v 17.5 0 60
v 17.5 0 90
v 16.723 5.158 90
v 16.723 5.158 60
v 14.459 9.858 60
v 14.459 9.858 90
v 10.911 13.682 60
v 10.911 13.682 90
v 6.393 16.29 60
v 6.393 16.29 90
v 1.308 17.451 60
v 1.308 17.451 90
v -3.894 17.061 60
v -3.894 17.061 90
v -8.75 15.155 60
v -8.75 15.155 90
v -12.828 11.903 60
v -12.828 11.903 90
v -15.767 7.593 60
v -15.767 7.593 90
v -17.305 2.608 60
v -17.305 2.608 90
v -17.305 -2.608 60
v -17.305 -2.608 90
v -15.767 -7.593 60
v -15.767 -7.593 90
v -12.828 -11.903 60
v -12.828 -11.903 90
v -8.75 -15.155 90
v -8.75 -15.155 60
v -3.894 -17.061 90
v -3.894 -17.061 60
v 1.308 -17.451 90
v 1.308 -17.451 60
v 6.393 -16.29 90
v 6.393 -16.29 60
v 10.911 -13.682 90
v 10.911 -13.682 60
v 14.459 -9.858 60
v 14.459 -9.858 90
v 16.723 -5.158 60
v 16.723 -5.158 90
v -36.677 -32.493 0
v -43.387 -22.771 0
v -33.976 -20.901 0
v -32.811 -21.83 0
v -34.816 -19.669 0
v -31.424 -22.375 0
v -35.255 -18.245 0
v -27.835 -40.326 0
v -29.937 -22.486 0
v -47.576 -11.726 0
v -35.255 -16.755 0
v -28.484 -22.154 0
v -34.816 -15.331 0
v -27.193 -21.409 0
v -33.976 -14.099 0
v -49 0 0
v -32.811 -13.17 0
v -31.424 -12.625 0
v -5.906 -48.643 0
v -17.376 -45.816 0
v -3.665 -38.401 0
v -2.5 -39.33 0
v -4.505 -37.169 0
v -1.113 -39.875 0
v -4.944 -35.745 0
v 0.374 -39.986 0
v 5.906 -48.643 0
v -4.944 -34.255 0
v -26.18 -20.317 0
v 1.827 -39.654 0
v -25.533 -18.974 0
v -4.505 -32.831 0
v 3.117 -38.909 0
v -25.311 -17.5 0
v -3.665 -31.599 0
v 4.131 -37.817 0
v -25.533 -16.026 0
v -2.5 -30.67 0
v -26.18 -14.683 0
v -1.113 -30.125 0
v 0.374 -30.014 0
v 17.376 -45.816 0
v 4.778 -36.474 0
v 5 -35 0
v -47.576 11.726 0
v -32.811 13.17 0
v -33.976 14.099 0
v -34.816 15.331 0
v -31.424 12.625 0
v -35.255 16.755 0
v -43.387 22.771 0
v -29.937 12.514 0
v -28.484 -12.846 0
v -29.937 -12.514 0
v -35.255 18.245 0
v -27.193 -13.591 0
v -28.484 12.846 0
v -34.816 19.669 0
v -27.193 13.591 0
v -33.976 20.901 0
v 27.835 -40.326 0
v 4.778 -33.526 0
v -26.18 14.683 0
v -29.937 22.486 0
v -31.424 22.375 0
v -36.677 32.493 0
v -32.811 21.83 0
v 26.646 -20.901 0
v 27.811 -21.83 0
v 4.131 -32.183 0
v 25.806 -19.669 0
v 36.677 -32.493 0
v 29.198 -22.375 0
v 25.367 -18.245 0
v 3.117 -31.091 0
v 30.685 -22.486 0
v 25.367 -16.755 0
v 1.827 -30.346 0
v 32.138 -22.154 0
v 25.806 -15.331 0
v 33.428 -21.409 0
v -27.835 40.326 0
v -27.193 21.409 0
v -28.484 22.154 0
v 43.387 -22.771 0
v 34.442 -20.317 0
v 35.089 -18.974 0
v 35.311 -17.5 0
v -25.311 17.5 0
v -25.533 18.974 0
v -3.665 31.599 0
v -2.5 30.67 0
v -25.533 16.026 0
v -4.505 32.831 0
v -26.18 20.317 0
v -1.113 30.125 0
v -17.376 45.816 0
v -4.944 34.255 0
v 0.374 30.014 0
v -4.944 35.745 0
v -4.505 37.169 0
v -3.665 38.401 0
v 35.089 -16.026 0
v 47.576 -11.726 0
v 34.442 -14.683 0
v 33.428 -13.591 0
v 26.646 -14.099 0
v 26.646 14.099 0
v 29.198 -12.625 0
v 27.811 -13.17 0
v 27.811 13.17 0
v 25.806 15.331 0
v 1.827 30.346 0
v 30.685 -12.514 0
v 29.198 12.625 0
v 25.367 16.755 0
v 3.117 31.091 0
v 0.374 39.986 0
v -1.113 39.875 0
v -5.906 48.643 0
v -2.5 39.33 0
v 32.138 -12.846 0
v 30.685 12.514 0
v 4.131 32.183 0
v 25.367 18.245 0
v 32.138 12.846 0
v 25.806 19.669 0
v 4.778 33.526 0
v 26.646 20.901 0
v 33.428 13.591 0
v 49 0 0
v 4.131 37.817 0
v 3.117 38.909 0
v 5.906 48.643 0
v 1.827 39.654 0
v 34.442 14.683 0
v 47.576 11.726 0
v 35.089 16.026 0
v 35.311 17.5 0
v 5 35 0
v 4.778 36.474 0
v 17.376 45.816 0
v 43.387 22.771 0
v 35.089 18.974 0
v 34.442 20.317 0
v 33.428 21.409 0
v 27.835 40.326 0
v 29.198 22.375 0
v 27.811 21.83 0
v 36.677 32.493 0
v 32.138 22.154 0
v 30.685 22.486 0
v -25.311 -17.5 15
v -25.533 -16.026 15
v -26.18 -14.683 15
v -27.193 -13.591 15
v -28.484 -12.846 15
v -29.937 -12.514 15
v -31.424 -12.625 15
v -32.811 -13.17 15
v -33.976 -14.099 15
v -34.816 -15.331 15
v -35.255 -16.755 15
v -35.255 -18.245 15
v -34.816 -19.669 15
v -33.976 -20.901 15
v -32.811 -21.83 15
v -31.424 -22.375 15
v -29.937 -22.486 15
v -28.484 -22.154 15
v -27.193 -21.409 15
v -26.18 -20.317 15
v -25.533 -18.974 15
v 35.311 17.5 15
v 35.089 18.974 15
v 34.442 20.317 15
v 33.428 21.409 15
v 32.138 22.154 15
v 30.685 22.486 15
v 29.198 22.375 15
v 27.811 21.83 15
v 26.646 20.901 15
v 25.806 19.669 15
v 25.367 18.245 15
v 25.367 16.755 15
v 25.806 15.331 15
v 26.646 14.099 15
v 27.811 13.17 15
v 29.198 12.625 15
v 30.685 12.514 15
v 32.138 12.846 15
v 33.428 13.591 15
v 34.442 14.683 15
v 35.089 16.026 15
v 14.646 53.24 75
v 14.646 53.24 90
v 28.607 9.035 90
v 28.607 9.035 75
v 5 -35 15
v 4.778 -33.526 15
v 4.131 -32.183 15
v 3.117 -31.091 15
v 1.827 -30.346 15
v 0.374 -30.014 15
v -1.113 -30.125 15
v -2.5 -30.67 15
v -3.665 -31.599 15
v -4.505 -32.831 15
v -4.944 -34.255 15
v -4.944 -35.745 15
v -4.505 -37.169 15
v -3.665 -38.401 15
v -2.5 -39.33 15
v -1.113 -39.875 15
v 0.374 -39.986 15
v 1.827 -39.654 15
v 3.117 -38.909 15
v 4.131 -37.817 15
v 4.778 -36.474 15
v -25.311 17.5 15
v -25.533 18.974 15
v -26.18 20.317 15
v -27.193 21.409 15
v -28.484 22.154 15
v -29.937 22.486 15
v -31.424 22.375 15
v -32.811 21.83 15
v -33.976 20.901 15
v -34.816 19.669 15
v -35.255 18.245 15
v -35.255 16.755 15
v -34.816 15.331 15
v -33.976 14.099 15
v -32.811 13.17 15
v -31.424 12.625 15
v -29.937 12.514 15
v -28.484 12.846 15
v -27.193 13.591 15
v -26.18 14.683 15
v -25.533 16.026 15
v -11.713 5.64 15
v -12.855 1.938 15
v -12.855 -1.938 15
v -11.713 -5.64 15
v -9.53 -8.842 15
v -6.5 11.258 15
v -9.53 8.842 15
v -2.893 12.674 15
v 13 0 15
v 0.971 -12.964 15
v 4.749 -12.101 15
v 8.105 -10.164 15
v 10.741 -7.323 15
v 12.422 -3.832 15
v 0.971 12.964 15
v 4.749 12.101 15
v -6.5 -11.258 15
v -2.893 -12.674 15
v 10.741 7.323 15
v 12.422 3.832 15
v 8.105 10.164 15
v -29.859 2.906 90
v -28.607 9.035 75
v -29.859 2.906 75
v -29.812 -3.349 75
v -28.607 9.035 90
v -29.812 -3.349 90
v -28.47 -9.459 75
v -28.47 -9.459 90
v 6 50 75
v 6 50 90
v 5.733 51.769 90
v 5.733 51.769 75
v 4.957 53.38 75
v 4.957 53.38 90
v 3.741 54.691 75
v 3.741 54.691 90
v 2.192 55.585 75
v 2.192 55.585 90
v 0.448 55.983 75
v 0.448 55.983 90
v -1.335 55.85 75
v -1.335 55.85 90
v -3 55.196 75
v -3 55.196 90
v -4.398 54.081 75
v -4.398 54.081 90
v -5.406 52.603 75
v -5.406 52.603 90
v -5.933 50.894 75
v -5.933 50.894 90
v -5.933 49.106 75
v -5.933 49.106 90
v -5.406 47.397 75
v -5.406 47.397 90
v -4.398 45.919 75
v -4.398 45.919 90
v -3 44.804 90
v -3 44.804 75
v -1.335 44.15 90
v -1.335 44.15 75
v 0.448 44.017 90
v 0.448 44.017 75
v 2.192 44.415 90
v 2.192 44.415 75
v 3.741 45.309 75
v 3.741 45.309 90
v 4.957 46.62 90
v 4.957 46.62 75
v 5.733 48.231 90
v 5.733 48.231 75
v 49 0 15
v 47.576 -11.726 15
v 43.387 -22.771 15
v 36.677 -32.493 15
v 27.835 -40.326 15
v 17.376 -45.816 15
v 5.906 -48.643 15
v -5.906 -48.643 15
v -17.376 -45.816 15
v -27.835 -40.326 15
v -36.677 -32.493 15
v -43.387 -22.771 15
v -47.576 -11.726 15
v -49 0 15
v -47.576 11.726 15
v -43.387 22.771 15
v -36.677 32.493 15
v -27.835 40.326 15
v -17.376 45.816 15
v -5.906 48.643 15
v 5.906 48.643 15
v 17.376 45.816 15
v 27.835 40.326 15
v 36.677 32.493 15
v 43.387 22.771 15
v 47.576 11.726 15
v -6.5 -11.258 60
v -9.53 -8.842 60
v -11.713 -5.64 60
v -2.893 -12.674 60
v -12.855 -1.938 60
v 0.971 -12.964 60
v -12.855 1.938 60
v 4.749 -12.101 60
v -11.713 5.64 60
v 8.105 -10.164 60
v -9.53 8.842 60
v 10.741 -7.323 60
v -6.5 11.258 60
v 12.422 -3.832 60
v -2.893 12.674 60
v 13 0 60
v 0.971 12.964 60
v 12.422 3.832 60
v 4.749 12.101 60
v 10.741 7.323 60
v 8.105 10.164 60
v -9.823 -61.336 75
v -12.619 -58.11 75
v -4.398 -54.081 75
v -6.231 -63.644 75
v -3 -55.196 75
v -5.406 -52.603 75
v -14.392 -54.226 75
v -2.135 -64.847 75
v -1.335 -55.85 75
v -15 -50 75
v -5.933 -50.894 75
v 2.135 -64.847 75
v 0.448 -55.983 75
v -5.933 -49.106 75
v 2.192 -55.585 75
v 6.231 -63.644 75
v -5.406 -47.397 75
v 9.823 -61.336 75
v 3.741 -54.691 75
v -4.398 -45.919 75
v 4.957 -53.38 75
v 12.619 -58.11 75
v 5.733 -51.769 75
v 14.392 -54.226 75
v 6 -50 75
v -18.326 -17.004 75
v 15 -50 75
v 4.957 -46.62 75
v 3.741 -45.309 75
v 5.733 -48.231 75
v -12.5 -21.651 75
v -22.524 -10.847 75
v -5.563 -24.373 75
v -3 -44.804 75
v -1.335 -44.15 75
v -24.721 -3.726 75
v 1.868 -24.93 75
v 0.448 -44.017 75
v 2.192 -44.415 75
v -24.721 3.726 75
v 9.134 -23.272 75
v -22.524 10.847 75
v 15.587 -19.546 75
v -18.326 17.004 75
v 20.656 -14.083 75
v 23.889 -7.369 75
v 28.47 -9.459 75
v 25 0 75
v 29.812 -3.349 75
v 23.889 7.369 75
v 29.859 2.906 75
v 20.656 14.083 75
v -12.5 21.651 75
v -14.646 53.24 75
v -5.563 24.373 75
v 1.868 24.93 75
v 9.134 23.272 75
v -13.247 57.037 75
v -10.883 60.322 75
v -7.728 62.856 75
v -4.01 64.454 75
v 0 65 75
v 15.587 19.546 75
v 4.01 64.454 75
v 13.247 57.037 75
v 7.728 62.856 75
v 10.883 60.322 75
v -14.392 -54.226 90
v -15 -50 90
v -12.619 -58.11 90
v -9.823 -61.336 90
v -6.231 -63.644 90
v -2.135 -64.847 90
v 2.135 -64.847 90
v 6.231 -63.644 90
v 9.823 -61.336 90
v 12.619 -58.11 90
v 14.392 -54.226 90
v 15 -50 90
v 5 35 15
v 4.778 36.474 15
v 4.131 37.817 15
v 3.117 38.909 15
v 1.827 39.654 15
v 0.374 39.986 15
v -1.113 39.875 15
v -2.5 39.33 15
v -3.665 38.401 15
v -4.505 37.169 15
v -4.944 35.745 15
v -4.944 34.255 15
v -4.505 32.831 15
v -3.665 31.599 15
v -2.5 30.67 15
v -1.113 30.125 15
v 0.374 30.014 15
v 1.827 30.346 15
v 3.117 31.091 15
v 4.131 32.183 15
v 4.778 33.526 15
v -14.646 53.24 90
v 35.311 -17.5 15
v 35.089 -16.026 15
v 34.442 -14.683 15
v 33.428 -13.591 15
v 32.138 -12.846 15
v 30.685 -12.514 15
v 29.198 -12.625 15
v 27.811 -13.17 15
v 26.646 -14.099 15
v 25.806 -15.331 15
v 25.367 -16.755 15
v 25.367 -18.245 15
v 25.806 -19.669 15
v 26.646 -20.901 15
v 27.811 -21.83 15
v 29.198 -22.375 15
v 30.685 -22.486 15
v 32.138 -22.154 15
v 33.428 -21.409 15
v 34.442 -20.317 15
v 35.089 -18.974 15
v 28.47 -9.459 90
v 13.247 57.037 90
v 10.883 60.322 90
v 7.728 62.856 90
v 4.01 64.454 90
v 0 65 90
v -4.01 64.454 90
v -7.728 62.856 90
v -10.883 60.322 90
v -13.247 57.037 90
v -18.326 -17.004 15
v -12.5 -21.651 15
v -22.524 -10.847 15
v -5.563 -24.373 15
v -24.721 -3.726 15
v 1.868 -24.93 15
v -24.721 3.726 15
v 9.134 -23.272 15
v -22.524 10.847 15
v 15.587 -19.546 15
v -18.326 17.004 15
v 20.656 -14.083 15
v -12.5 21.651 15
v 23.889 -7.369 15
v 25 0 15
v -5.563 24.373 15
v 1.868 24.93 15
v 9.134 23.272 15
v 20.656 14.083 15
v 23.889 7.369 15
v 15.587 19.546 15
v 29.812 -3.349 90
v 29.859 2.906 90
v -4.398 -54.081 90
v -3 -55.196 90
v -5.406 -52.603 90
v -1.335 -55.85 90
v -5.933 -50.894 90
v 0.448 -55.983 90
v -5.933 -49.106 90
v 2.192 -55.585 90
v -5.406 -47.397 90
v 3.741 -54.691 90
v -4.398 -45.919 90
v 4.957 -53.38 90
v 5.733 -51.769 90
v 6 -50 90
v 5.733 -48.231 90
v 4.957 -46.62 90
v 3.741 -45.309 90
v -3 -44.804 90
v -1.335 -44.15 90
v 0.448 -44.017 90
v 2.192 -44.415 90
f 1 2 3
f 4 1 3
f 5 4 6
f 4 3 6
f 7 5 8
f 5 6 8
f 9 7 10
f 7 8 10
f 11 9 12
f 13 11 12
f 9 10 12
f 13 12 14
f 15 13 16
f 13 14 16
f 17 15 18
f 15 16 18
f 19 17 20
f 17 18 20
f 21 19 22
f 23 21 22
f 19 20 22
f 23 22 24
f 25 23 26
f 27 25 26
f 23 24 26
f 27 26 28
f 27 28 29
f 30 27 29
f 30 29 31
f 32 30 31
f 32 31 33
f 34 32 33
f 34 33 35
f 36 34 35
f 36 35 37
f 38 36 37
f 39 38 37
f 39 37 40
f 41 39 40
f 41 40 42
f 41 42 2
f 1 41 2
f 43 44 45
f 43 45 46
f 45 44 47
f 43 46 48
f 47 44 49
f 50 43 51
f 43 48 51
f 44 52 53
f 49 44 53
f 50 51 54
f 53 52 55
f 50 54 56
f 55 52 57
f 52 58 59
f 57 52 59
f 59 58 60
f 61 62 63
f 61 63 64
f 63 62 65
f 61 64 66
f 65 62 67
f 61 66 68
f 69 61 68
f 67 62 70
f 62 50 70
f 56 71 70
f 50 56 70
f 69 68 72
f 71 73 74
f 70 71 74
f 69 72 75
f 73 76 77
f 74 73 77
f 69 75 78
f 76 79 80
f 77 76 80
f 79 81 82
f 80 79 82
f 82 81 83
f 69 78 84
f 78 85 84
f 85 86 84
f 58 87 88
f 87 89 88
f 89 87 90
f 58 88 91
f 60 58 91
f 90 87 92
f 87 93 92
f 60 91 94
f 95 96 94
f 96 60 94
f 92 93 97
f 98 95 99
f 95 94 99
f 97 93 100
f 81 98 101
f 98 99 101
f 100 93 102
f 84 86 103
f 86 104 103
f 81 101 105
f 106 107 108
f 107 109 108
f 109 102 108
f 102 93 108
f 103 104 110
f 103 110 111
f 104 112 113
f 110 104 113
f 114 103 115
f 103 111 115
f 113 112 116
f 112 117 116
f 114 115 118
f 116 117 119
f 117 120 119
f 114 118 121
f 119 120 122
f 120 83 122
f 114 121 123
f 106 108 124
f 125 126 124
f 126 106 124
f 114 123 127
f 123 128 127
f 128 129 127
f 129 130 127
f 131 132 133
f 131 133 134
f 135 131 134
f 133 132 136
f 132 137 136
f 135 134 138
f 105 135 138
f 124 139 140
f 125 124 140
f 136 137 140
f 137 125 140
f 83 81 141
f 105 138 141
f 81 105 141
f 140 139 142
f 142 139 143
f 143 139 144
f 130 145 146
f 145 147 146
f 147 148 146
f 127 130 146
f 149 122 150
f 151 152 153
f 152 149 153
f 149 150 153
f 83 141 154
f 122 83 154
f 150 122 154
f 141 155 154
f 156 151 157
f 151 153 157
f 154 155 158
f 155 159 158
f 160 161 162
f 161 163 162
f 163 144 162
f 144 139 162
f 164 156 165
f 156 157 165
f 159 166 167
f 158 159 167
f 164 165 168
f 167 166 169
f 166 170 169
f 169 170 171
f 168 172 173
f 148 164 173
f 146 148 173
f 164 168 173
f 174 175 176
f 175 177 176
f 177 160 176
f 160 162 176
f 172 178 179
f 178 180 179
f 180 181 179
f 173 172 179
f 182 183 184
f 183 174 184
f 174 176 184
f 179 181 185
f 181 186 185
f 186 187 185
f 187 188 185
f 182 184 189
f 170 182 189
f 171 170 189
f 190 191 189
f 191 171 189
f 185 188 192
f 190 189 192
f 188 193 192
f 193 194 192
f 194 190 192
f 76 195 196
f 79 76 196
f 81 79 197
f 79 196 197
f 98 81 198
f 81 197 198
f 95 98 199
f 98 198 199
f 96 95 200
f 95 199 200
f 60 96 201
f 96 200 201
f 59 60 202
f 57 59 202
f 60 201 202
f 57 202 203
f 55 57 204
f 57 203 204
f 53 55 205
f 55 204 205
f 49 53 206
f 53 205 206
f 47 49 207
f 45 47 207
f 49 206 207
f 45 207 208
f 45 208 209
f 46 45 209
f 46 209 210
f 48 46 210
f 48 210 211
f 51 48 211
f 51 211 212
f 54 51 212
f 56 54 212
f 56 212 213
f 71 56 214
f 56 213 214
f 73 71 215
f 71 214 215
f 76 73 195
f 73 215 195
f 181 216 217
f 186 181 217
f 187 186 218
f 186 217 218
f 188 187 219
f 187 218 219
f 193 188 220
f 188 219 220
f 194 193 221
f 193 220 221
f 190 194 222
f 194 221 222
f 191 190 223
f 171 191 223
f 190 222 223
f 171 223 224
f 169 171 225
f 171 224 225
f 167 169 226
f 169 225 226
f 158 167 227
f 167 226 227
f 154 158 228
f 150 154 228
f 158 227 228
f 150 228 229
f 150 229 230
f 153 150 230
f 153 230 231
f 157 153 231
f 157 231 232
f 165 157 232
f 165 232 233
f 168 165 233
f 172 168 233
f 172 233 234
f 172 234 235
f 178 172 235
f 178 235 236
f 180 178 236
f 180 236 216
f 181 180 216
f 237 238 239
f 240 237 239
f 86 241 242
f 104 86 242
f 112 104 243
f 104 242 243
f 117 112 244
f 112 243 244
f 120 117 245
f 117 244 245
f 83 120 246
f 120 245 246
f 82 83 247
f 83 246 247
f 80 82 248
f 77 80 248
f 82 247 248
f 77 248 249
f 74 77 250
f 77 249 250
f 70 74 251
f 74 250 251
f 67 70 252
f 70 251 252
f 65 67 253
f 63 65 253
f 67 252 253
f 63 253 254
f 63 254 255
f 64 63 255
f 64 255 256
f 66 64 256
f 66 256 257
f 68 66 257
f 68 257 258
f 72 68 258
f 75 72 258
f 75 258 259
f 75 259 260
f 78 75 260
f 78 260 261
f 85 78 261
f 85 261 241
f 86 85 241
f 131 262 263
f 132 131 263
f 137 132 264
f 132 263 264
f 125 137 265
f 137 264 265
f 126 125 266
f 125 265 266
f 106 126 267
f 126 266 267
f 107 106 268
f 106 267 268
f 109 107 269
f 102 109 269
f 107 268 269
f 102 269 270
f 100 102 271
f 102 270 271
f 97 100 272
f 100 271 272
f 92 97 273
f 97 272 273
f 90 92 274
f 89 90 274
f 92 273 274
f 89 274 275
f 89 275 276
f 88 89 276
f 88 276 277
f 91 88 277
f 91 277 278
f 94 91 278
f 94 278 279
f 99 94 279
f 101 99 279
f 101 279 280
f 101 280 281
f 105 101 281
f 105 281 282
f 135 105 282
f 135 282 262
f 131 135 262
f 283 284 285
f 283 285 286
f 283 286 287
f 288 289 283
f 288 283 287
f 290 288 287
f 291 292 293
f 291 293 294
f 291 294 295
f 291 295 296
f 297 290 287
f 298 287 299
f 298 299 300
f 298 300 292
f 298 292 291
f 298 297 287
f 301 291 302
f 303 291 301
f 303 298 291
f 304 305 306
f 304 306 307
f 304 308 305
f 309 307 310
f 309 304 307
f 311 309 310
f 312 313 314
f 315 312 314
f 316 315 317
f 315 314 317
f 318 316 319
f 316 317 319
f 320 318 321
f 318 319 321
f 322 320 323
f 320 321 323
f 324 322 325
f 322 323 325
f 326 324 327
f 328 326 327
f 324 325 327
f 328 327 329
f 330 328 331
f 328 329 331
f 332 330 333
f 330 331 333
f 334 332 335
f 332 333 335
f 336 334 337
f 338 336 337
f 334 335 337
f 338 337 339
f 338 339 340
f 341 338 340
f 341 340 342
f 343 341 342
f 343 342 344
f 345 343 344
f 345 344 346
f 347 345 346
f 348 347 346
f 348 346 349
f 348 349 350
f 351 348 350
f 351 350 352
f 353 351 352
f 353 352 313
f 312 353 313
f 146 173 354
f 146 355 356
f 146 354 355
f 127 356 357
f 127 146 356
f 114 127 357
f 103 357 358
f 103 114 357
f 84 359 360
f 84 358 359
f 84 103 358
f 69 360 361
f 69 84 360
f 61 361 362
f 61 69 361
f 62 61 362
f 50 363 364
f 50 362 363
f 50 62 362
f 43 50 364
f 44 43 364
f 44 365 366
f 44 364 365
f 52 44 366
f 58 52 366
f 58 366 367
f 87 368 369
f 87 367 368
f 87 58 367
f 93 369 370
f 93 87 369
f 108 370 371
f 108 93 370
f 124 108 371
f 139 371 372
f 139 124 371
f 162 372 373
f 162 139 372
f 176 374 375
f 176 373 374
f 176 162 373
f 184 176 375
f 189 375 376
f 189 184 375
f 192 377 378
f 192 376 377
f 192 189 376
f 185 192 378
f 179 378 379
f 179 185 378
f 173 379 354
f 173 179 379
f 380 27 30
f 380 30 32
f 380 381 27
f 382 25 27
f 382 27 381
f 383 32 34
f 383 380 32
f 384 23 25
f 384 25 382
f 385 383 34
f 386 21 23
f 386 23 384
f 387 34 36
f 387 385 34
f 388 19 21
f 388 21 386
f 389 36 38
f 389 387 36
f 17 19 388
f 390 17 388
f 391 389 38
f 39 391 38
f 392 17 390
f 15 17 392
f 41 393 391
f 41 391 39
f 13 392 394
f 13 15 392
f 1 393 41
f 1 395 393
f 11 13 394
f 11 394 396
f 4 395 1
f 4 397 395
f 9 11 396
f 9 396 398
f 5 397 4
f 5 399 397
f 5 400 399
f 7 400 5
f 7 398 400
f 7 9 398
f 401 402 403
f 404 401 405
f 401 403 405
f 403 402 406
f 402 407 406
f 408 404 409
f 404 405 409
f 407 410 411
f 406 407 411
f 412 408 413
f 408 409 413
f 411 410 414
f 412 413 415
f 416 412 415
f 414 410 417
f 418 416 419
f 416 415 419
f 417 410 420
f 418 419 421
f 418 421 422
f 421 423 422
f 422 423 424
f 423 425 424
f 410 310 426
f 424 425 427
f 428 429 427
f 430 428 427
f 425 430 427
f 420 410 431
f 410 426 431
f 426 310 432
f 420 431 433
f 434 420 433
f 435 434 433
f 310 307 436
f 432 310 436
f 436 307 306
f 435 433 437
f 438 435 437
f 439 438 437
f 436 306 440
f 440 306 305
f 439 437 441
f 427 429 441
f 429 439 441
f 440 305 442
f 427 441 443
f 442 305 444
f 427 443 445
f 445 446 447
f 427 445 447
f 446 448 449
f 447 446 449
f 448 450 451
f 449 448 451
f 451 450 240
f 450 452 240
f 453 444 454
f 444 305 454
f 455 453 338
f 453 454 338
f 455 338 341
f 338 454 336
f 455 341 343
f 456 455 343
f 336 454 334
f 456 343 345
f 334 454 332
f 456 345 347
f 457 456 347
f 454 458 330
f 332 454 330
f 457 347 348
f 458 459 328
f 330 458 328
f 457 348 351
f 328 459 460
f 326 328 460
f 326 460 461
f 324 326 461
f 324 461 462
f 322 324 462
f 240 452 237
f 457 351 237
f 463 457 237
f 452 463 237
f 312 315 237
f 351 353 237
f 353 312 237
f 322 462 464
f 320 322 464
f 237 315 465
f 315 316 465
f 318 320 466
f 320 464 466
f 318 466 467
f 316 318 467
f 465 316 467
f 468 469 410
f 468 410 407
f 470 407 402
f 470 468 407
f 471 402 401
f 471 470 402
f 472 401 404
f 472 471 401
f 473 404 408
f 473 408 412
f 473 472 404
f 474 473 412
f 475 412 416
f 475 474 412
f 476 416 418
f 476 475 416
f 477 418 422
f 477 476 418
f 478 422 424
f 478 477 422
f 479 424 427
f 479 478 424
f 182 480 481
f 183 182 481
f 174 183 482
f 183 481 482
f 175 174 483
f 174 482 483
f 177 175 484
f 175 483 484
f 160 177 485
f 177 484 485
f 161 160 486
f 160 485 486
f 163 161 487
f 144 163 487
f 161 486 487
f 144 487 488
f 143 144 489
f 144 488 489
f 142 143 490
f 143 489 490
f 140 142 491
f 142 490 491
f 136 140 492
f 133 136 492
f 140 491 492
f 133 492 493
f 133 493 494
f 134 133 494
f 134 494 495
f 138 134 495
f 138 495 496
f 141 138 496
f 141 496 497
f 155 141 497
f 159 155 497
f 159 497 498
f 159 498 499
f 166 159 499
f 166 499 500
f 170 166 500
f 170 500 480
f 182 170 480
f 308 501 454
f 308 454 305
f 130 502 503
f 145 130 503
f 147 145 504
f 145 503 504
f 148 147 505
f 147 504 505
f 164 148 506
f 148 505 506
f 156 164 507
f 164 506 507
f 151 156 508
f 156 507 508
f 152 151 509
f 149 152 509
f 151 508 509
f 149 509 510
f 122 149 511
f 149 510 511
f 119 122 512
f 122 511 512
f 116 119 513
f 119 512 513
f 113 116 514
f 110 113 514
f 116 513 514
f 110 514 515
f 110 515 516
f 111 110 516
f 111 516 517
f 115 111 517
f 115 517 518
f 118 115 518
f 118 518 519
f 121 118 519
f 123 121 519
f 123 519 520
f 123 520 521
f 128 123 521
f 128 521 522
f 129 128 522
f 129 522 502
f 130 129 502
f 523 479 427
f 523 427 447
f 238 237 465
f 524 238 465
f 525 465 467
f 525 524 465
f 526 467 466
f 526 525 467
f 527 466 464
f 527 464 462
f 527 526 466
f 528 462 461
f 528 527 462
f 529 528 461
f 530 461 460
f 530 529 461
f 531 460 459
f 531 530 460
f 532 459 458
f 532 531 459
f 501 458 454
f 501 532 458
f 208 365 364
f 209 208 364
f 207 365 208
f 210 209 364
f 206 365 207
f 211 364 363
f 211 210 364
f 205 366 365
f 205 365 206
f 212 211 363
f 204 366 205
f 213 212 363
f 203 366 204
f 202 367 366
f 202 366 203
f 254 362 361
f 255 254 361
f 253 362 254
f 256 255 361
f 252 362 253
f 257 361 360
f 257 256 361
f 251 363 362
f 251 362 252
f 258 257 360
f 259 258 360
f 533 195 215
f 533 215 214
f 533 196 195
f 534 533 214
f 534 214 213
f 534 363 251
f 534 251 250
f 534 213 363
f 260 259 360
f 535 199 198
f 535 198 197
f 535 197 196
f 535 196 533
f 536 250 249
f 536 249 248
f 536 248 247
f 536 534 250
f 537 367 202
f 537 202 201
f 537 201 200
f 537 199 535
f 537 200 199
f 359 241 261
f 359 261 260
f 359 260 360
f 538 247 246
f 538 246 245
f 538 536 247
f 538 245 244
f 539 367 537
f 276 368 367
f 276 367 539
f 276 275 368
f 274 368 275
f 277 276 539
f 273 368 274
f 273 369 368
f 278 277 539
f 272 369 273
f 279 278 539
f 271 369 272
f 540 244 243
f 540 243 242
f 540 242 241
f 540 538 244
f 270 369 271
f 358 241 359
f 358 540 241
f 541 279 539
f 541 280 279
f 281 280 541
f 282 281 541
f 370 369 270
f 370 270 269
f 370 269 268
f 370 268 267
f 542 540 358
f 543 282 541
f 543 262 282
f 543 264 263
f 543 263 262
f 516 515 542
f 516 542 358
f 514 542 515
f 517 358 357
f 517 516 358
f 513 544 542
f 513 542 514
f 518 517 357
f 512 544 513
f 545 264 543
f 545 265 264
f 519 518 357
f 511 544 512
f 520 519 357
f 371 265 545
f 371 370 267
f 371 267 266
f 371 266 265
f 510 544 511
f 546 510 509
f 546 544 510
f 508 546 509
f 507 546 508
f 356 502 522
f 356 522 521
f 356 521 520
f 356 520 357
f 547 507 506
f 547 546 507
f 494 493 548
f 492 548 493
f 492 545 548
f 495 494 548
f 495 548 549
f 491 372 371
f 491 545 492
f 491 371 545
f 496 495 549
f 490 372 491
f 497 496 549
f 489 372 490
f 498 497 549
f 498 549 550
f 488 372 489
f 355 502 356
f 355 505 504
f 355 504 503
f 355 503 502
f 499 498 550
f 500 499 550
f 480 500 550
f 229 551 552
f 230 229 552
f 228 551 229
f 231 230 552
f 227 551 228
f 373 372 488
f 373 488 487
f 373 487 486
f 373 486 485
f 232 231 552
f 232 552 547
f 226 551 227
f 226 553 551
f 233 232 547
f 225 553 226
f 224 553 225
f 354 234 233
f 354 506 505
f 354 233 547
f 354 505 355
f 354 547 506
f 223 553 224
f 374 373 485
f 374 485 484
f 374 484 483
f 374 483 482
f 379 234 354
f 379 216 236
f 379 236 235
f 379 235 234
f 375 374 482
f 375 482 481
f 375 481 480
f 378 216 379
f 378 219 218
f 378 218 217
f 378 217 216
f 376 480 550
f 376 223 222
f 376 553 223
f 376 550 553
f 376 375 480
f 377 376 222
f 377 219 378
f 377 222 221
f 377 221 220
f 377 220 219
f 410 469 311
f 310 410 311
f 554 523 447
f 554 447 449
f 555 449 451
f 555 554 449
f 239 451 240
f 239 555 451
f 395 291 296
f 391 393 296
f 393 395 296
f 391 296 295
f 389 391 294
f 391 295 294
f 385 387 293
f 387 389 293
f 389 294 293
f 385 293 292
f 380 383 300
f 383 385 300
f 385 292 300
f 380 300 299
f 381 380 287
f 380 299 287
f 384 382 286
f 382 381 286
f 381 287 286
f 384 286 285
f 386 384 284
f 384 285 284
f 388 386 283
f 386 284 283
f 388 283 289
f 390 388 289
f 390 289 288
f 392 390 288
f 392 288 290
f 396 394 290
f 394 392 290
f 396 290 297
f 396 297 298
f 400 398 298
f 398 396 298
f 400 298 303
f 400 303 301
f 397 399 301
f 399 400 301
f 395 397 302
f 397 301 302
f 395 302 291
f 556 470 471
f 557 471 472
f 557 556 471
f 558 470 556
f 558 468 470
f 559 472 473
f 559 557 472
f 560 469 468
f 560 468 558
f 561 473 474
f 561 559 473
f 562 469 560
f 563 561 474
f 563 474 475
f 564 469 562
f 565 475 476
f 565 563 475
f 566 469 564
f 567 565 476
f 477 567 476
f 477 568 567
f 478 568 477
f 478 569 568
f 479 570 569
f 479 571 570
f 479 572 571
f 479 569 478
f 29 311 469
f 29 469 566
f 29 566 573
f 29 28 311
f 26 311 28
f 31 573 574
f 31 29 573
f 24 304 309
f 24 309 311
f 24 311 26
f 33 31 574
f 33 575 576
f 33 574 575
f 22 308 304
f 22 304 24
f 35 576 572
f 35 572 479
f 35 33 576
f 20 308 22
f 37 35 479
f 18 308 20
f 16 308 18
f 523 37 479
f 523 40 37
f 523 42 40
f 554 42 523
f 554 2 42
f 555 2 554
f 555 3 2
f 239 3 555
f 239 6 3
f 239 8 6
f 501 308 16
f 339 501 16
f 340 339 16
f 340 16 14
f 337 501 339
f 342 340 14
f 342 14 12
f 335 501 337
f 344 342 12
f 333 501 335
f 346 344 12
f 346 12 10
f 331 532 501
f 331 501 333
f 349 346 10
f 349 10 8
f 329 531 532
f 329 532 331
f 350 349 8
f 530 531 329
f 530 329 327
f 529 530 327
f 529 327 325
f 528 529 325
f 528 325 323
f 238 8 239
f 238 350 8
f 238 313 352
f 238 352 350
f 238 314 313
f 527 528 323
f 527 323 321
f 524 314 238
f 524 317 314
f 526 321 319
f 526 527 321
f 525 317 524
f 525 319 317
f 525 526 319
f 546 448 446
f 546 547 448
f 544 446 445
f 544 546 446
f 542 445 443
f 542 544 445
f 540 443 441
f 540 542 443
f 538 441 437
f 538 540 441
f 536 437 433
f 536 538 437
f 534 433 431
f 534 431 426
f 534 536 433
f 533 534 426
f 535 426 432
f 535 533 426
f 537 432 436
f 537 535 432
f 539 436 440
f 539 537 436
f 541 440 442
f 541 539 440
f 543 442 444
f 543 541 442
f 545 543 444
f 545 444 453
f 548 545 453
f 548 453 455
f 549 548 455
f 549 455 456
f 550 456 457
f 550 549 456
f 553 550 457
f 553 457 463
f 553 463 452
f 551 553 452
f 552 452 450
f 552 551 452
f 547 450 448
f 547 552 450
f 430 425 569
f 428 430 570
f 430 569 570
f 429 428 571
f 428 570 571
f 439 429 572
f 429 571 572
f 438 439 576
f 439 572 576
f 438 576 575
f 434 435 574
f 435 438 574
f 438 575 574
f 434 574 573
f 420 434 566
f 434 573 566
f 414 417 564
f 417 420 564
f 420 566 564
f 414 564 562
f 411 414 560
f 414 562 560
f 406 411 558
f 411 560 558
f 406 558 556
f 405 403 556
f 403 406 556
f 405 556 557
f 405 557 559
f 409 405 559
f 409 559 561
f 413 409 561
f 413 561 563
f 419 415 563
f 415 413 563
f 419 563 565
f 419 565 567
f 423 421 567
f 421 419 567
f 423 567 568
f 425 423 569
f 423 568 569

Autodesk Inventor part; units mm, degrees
ref_plane "YZ Plane" through (0, 0, 0) normal (1, 0, 0) x (0, 1, 0)
ref_plane "XZ Plane" through (0, 0, 0) normal (0, 1, 0) x (-1, 0, 0)
ref_plane "XY Plane" through (0, 0, 0) normal (0, 0, 1) x (1, 0, 0)
sketch "Sketch1" plane through (0, 0, 0) normal (0, 0, 1) x (1, 0, 0)
  circle A0 centre (0, 0) radius 49
  dimension "d0" = 98
extrude "Extrusion1" add sketch "Sketch1" along normal blind 15
sketch "Sketch2" plane through (0, 0, 15) normal (0, 0, 1) x (1, 0, 0)
  circle A0 centre (0, 0) radius 35
  circle A1 centre (0, 35) radius 5
  circle A2 centre (-30.3109, 17.5) radius 5
  circle A3 centre (-30.3109, -17.5) radius 5
  circle A4 centre (0, -35) radius 5
  circle A5 centre (30.3109, -17.5) radius 5
  circle A6 centre (30.3109, 17.5) radius 5
  dimension "d3" = 70
  dimension "d4" = 10
  dimension "d7" = 360
extrude "Extrusion2" cut sketch "Sketch2" against normal up to next contours A6 A0 | A0 A6 | A5 A0 | A0 A5 | A1 A0 | A0 A1 | A4 A0 | A0 A4 | A2 A0 | A0 A2 | A3 A0 | A0 A3
sketch "Sketch3" plane through (0, 0, 15) normal (0, 0, 1) x (1, 0, 0)
  circle A0 centre (0, 0) radius 25
  dimension "d11" = 50
extrude "Extrusion3" add sketch "Sketch3" along normal blind 75
sketch "Sketch4" plane through (0, 0, 15) normal (0, 0, 1) x (1, 0, 0)
  circle A0 centre (0, 0) radius 13
  dimension "d14" = 26
extrude "Extrusion4" cut sketch "Sketch4" along normal blind 45
sketch "Sketch5" plane through (0, 0, 90) normal (0, 0, 1) x (1, 0, 0)
  line L0 (0, 0) -> (0, 50)
  line L1 (0, 0) -> (0, -50)
  arc A0 (-14.6459, -46.76) -> (14.6459, -46.76) centre (0, -50) ccw
  arc A1 (14.6459, 46.76) -> (-14.6459, 46.76) centre (0, 50) ccw
  circle A2 centre (0, 0) radius 49 projected
  circle A3 centre (0, 50) radius 6
  circle A4 centre (0, -50) radius 6
  line L2 (-15, -50) -> (-28.4697, -9.4591)
  line L3 (15, -50) -> (28.4697, -9.4591)
  line L4 (-14.6459, 53.24) -> (-28.6072, 9.035)
  line L5 (14.6459, 53.24) -> (28.6072, 9.035)
  arc A5 (-28.6072, 9.035) -> (-28.4697, -9.4591) centre (0, 0) ccw
  arc A6 (28.4697, -9.4591) -> (28.6072, 9.035) centre (0, 0) ccw
  point P0 (16.254, -46.2256)
  point P1 (16.9391, 45.979)
  point P2 (-16.9391, 45.979)
  point P3 (-16.254, -46.2256)
  dimension "d17" = 50
  dimension "d18" = 50
  dimension "d19" = 30
  dimension "d20" = 30
  dimension "d22" = 12
  dimension "d23" = 12
extrude "Extrusion5" add sketch "Sketch5" against normal blind 15 contours L1 A4 A2 L2 A5 L4 A3 L0 | L0 A3 A2 L5 A6 L3 A4 L1 | A2 A1 A3 | A2 A0 A4 | A2 L4 A1 | A1 L5 A2 | A2 L3 A0 | A0 L2 A2
sketch "Sketch6" plane through (0, 0, 90) normal (0, 0, 1) x (1, 0, 0)
  line L0 (15, -50) -> (28.4697, -9.4591) projected
  arc A0 (28.4697, -9.4591) -> (28.6072, 9.035) centre (0, 0) ccw projected
  line L1 (28.6072, 9.035) -> (14.6459, 53.24) projected
  arc A1 (14.6459, 53.24) -> (-14.6459, 53.24) centre (0, 50) ccw projected
  line L2 (-14.6459, 53.24) -> (-28.6072, 9.035) projected
  arc A2 (-28.6072, 9.035) -> (-28.4697, -9.4591) centre (0, 0) ccw projected
  line L3 (-28.4697, -9.4591) -> (-15, -50) projected
  arc A3 (-15, -50) -> (15, -50) centre (0, -50) ccw projected
  circle A4 centre (0, -50) radius 6 projected
  circle A5 centre (0, 50) radius 6 projected
  circle A6 centre (0, 0) radius 17.5
  dimension "d26" = 35
extrude "Extrusion6" cut sketch "Sketch6" against normal blind 30 contours A6
properties part number "PIEZA_3D_2EX"
